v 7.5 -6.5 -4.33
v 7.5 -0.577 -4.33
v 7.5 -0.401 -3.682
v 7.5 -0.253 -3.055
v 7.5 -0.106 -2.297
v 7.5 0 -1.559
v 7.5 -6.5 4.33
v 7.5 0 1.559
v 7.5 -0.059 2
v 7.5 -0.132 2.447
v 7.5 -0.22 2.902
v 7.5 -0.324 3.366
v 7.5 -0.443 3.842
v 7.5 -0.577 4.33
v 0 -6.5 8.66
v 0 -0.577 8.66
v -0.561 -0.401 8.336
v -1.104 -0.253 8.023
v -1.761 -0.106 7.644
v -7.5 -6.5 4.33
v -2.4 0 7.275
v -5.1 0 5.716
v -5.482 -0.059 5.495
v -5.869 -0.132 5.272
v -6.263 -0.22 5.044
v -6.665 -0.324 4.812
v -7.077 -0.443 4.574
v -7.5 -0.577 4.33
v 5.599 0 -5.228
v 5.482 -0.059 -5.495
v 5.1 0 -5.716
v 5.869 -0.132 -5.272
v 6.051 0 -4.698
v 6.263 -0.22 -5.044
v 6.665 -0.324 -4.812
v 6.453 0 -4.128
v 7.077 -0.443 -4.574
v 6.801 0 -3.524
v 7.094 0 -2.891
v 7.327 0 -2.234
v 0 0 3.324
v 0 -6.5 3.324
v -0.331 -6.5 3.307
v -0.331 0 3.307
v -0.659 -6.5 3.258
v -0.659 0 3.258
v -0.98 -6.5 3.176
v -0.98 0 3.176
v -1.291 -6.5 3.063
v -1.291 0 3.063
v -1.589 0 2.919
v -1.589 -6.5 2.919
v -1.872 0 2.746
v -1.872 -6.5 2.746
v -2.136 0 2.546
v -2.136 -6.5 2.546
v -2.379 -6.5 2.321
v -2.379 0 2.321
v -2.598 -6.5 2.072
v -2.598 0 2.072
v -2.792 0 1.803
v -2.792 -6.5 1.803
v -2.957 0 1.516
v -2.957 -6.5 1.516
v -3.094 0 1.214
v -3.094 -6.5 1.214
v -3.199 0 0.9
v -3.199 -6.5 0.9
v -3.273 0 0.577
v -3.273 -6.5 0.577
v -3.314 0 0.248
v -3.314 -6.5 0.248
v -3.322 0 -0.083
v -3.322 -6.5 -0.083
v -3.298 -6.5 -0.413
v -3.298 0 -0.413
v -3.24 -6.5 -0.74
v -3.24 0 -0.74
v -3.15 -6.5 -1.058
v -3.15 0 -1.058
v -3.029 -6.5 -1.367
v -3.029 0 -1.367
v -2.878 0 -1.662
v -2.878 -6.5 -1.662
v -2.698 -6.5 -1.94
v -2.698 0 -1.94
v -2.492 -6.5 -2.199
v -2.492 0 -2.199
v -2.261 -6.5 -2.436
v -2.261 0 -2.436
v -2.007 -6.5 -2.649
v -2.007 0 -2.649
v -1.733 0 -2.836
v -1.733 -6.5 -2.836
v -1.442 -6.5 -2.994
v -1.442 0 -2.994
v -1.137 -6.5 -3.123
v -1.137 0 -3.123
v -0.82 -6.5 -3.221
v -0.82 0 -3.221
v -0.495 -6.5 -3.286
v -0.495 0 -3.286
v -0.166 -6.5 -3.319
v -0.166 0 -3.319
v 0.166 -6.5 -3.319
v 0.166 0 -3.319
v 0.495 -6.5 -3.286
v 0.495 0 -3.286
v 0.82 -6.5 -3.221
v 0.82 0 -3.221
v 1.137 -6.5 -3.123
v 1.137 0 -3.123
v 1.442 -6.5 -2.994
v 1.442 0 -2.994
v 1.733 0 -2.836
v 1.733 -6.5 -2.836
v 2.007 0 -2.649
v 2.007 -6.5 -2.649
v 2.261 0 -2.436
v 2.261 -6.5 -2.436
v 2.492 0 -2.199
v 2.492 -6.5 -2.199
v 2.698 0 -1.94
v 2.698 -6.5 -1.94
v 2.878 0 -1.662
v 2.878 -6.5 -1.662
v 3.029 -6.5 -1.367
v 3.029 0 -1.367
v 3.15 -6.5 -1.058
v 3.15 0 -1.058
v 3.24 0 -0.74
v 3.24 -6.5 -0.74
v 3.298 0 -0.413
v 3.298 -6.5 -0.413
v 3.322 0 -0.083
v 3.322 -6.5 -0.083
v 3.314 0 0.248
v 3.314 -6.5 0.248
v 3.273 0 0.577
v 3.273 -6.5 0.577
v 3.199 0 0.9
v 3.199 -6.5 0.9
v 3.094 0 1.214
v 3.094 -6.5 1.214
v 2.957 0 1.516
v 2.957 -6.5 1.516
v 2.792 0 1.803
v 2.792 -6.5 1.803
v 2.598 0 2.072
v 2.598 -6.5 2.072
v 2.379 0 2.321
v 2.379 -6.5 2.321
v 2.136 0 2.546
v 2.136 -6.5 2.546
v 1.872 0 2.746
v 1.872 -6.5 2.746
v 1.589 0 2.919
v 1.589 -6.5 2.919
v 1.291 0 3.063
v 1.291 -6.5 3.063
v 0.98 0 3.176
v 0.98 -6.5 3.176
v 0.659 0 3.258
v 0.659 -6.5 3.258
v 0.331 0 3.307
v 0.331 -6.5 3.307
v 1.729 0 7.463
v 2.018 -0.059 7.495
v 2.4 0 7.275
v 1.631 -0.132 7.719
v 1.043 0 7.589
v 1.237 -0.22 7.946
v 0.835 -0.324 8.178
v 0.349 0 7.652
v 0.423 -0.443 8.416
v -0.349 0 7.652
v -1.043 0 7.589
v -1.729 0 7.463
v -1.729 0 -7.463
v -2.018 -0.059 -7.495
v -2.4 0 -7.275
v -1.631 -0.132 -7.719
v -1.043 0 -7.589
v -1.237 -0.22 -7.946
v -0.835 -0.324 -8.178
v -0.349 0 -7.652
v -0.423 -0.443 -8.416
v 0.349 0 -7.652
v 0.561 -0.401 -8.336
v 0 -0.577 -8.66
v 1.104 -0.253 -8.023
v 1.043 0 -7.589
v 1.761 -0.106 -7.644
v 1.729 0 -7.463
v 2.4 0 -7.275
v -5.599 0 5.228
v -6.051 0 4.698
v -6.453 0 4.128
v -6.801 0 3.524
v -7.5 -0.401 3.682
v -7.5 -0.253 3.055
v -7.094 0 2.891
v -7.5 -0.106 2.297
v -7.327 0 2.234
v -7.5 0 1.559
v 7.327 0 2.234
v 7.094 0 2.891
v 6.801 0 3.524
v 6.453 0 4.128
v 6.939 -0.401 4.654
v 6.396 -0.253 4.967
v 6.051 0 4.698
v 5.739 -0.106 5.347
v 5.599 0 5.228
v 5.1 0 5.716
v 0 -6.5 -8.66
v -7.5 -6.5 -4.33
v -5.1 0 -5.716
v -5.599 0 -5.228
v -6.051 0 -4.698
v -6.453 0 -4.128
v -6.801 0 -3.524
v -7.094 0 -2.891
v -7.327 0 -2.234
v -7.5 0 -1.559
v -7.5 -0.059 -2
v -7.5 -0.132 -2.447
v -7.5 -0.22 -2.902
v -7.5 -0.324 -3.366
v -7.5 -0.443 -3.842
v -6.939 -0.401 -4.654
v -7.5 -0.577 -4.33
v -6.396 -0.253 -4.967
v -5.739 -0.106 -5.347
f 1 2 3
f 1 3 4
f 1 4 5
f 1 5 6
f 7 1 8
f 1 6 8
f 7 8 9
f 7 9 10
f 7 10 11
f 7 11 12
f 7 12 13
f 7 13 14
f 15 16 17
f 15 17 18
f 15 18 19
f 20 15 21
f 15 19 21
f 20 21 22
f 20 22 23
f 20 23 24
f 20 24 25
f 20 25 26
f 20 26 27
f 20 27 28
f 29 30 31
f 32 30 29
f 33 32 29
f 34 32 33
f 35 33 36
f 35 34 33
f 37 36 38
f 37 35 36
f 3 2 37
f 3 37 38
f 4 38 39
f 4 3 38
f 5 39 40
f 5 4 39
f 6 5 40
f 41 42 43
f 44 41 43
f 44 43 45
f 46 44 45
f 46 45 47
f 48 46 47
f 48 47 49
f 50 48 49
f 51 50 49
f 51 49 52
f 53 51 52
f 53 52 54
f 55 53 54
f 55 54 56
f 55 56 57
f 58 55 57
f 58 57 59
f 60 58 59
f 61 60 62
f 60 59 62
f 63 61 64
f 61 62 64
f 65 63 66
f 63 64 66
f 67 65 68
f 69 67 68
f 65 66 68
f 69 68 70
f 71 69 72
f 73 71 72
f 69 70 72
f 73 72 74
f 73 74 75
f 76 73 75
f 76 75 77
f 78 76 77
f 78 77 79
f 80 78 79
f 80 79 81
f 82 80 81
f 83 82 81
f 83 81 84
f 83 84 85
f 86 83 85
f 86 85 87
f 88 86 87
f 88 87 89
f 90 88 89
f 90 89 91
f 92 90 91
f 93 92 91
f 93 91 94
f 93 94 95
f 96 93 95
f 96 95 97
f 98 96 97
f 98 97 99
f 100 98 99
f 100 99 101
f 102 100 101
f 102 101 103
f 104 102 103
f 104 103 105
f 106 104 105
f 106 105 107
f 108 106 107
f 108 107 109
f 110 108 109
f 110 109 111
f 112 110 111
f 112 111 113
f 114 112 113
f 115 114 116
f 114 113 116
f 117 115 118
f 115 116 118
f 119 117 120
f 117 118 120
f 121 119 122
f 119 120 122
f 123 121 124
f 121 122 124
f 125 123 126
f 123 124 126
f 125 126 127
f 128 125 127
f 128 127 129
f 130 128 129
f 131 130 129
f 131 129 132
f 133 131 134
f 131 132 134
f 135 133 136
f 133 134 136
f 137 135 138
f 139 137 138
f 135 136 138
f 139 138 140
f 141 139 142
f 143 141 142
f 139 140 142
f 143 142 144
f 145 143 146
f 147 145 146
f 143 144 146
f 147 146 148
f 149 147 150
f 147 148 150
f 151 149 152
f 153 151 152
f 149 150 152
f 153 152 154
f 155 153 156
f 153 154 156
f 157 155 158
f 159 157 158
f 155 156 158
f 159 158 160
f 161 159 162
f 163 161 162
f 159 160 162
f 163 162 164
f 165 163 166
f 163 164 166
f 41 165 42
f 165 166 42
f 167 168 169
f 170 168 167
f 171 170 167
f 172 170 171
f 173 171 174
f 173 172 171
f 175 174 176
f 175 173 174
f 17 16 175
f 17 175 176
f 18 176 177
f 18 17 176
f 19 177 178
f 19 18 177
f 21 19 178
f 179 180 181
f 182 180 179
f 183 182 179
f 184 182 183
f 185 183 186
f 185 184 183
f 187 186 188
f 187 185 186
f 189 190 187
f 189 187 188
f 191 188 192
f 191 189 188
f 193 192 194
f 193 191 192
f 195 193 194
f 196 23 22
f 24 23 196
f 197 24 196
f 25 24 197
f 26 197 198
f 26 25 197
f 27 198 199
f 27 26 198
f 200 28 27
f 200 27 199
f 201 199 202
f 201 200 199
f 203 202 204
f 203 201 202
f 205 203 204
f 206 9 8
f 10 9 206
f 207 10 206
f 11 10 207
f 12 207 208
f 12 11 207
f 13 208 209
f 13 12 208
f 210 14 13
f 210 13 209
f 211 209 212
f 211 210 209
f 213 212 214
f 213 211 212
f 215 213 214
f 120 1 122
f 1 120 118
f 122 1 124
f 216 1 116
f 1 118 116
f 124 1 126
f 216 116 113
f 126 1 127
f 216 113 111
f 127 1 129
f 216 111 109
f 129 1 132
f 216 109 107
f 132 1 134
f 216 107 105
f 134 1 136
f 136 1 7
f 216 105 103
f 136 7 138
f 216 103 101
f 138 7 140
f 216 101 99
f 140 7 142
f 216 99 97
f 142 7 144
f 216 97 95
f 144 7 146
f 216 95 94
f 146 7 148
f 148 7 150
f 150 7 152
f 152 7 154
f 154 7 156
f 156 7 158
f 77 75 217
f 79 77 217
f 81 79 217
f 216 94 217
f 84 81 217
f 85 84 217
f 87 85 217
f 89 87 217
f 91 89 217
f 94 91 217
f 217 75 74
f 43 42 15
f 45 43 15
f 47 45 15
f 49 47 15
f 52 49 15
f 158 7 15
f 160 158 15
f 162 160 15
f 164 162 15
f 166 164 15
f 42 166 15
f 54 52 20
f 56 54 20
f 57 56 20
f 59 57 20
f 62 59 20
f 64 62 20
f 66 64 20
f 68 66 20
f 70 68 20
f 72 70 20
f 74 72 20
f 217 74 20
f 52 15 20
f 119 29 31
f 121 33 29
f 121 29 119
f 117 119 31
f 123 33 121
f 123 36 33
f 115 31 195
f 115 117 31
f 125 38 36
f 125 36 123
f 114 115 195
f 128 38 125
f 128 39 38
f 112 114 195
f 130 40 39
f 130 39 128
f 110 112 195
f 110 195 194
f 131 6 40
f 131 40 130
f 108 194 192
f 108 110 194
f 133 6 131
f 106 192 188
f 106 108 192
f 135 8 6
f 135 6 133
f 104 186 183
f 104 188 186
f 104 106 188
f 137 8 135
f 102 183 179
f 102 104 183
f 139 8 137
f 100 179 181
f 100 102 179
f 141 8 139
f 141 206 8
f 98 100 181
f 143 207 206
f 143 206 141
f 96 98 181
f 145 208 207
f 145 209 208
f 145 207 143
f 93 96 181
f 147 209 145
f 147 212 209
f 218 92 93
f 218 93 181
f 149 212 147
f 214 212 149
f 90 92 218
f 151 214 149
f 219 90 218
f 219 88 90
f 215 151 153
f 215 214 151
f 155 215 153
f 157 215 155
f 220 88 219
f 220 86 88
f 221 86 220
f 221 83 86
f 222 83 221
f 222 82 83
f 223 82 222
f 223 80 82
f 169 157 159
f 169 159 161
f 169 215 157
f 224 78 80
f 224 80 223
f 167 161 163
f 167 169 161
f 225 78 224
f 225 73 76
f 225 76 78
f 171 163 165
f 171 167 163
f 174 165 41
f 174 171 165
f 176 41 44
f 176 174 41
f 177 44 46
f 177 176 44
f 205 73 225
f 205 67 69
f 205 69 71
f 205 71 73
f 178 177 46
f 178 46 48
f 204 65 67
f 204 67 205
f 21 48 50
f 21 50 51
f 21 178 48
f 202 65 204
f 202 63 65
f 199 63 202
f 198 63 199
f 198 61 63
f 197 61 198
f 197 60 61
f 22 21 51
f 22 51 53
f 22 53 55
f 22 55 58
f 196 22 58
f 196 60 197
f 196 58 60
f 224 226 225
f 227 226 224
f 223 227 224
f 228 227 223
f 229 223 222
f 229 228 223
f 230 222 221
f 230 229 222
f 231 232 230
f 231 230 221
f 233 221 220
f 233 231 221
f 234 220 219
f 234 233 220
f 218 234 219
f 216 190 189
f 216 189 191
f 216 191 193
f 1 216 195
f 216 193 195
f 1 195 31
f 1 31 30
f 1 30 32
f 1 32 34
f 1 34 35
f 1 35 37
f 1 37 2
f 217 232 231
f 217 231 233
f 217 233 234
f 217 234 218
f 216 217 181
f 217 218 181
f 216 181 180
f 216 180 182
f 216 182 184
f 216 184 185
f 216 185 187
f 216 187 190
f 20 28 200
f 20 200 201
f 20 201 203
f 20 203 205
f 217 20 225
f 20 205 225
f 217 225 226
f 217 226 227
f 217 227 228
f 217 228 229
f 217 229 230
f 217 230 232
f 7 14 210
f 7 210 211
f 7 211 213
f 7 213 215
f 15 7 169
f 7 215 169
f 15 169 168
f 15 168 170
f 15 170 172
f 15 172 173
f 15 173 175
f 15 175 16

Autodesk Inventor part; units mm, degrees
ref_plane "YZ Plane" through (0, 0, 0) normal (1, 0, 0) x (0, 1, 0)
ref_plane "XZ Plane" through (0, 0, 0) normal (0, 1, 0) x (-1, 0, 0)
ref_plane "XY Plane" through (0, 0, 0) normal (0, 0, 1) x (1, 0, 0)
sketch "Sketch1" plane through (0, 0, 0) normal (0, 1, 0) x (-1, 0, 0)
  line L0 (7.5, -4.3301) -> (0, -8.6603)
  line L1 (0, -8.6603) -> (-7.5, -4.3301)
  line L2 (-7.5, -4.3301) -> (-7.5, 4.3301)
  line L3 (-7.5, 4.3301) -> (0, 8.6603)
  line L4 (0, 8.6603) -> (7.5, 4.3301)
  line L5 (7.5, 4.3301) -> (7.5, -4.3301)
  line L6 (-7.5, 0) -> (7.5, 0)
  line L7 (0, 8.6603) -> (0, -8.6603)
  point P0 (0, 0)
  point P1 (0, 0)
  dimension "d0" = 15
extrude "Extrusion1" add sketch "Sketch1" against normal blind 6.5
sketch "Sketch2" plane through (0, 0, 0) normal (1, 0, 0) x (0, 1, 0)
  point P0 (0, 0)
sketch "Sketch6" plane through (0, 0, 0) normal (1, 0, 0) x (0, 1, 0)
  line L0 (0, 8.6603) -> (0, 4.3301) projected
  line L1 (0, 4.3301) -> (-6.5, 4.3301) projected
  line L2 (-6.5, 8.6603) -> (-6.5, 4.3301) projected
  line L3 (0, 8.6603) -> (-6.5, 8.6603) projected
  line L4 (0, 8.6603) -> (0, 7.6603)
  line L5 (-0.5774, 8.6603) -> (0, 8.6603)
  line L6 (-0.5774, 8.6603) -> (0, 7.6603)
  line L7 (-0.3756, 0) -> (-10.093, 0)
  point P0 (0, 0)
  dimension "d6" = 1
  dimension "d7" = 30
revolve "Revolution1" cut sketch "Sketch6" angle 360 about axis through (0, -0.3756, 0) along (0, -1, 0) contours L0 L6 L3
sketch "Sketch7" plane through (0, 0, 0) normal (0, 1, 0) x (1, 0, 0)
  arc A0 (-5.0999, 5.7158) -> (-7.5, 1.5587) centre (0, 0) ccw projected
hole "Hole1" at (0, 0, 0) direction (0, -1, 0) diameter 6.647 end through all thread size "M8x1.25" class "6H" standard "ANSI Metric M Profile"
properties part number "M8_driving_nut"
